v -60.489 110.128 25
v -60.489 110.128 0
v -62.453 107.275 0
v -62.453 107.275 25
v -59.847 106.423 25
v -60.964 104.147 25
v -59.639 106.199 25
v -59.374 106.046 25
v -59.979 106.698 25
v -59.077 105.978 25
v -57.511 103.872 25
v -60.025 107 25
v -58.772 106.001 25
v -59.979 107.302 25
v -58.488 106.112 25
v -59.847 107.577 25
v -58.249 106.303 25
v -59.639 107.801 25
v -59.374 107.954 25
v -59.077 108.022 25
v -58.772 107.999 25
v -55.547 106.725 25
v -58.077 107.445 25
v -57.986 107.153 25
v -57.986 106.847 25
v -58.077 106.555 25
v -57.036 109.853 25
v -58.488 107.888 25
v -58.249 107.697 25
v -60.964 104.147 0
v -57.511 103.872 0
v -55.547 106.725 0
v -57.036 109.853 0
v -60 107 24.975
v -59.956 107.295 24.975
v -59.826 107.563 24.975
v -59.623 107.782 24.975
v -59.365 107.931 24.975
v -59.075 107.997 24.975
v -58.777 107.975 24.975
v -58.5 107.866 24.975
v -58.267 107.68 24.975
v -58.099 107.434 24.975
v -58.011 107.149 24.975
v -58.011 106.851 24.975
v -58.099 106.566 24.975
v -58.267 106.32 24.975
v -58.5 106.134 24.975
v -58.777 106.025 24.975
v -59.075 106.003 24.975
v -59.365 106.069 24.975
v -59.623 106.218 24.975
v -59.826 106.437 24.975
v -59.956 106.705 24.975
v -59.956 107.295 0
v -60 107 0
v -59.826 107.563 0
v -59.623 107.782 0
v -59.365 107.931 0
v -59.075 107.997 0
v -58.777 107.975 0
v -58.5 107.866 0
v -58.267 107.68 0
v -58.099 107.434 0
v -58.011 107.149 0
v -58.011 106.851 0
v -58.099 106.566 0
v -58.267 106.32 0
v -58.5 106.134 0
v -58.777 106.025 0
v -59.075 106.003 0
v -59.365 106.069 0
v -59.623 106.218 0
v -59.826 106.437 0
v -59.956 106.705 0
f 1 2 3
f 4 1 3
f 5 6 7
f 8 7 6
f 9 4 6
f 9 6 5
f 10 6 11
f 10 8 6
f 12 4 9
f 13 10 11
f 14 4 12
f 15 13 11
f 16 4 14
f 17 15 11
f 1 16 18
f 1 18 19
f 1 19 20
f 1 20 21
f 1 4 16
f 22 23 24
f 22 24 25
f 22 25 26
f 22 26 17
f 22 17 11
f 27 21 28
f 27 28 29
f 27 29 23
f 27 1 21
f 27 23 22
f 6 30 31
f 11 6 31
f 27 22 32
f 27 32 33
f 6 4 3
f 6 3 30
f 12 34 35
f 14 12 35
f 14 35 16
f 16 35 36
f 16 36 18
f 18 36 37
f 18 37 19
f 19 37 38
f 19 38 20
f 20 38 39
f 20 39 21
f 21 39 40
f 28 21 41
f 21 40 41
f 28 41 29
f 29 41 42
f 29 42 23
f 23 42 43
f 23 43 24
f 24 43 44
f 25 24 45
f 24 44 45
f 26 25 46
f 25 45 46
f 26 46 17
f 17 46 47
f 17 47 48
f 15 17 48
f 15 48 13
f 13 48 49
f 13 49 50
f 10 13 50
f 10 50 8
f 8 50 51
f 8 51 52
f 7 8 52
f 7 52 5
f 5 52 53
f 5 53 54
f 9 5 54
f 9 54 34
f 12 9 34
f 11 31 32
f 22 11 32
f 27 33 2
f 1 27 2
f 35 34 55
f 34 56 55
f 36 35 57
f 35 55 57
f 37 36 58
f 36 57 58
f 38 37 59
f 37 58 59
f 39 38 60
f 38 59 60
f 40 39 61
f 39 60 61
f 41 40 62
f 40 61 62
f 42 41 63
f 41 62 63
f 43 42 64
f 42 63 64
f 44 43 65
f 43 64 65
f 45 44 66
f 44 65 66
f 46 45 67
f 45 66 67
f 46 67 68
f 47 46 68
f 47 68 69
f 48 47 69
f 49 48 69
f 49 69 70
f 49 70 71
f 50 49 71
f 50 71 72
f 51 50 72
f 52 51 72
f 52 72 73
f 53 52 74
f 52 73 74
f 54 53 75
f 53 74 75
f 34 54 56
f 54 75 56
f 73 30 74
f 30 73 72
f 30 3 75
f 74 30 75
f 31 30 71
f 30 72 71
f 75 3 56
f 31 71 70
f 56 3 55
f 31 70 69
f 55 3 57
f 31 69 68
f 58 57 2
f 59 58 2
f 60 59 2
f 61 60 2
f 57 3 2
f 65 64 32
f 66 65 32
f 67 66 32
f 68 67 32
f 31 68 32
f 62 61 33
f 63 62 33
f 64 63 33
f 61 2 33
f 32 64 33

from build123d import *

# Parameters (mm, degrees)
BOSS_EXTRUDE1_DEPTH             = 25
F_2_0MM_DOWEL_HOLE1_D           = 2
F_2_0MM_DOWEL_HOLE1_DEPTH       = 25
F_2_0MM_DOWEL_HOLE1_CSINK_D     = 2.05
F_2_0MM_DOWEL_HOLE1_CSINK_ANGLE = 90
F_2_0MM_DOWEL_HOLE1_TIP         = 0.600860619


with BuildPart() as part:
    # Sketch1 → Boss-Extrude1 (new body)
    with BuildSketch(Plane.XY):
        Polygon((-60.488817819, 110.127846144), (-62.453203129, 107.27456902), (-60.964385311, 104.146722875), (-57.511182181, 103.872153856), (-55.546796871, 106.72543098), (-57.035614689, 109.853277125), align=None)
    extrude(amount=BOSS_EXTRUDE1_DEPTH)

    # Ø2.0mm Dowel Hole1
    with Locations(Plane(origin=(-59, 107, 25), x_dir=(1, 0, 0), z_dir=(0, 0, 1))):
        with Locations((0, 0)):
            CounterSinkHole(F_2_0MM_DOWEL_HOLE1_D / 2, F_2_0MM_DOWEL_HOLE1_CSINK_D / 2, depth=F_2_0MM_DOWEL_HOLE1_DEPTH, counter_sink_angle=F_2_0MM_DOWEL_HOLE1_CSINK_ANGLE)
            with Locations((0, 0, -(F_2_0MM_DOWEL_HOLE1_DEPTH + F_2_0MM_DOWEL_HOLE1_TIP / 2))):  # 118° drill point
                Cone(0, F_2_0MM_DOWEL_HOLE1_D / 2, F_2_0MM_DOWEL_HOLE1_TIP, mode=Mode.SUBTRACT)


solid = part.part
